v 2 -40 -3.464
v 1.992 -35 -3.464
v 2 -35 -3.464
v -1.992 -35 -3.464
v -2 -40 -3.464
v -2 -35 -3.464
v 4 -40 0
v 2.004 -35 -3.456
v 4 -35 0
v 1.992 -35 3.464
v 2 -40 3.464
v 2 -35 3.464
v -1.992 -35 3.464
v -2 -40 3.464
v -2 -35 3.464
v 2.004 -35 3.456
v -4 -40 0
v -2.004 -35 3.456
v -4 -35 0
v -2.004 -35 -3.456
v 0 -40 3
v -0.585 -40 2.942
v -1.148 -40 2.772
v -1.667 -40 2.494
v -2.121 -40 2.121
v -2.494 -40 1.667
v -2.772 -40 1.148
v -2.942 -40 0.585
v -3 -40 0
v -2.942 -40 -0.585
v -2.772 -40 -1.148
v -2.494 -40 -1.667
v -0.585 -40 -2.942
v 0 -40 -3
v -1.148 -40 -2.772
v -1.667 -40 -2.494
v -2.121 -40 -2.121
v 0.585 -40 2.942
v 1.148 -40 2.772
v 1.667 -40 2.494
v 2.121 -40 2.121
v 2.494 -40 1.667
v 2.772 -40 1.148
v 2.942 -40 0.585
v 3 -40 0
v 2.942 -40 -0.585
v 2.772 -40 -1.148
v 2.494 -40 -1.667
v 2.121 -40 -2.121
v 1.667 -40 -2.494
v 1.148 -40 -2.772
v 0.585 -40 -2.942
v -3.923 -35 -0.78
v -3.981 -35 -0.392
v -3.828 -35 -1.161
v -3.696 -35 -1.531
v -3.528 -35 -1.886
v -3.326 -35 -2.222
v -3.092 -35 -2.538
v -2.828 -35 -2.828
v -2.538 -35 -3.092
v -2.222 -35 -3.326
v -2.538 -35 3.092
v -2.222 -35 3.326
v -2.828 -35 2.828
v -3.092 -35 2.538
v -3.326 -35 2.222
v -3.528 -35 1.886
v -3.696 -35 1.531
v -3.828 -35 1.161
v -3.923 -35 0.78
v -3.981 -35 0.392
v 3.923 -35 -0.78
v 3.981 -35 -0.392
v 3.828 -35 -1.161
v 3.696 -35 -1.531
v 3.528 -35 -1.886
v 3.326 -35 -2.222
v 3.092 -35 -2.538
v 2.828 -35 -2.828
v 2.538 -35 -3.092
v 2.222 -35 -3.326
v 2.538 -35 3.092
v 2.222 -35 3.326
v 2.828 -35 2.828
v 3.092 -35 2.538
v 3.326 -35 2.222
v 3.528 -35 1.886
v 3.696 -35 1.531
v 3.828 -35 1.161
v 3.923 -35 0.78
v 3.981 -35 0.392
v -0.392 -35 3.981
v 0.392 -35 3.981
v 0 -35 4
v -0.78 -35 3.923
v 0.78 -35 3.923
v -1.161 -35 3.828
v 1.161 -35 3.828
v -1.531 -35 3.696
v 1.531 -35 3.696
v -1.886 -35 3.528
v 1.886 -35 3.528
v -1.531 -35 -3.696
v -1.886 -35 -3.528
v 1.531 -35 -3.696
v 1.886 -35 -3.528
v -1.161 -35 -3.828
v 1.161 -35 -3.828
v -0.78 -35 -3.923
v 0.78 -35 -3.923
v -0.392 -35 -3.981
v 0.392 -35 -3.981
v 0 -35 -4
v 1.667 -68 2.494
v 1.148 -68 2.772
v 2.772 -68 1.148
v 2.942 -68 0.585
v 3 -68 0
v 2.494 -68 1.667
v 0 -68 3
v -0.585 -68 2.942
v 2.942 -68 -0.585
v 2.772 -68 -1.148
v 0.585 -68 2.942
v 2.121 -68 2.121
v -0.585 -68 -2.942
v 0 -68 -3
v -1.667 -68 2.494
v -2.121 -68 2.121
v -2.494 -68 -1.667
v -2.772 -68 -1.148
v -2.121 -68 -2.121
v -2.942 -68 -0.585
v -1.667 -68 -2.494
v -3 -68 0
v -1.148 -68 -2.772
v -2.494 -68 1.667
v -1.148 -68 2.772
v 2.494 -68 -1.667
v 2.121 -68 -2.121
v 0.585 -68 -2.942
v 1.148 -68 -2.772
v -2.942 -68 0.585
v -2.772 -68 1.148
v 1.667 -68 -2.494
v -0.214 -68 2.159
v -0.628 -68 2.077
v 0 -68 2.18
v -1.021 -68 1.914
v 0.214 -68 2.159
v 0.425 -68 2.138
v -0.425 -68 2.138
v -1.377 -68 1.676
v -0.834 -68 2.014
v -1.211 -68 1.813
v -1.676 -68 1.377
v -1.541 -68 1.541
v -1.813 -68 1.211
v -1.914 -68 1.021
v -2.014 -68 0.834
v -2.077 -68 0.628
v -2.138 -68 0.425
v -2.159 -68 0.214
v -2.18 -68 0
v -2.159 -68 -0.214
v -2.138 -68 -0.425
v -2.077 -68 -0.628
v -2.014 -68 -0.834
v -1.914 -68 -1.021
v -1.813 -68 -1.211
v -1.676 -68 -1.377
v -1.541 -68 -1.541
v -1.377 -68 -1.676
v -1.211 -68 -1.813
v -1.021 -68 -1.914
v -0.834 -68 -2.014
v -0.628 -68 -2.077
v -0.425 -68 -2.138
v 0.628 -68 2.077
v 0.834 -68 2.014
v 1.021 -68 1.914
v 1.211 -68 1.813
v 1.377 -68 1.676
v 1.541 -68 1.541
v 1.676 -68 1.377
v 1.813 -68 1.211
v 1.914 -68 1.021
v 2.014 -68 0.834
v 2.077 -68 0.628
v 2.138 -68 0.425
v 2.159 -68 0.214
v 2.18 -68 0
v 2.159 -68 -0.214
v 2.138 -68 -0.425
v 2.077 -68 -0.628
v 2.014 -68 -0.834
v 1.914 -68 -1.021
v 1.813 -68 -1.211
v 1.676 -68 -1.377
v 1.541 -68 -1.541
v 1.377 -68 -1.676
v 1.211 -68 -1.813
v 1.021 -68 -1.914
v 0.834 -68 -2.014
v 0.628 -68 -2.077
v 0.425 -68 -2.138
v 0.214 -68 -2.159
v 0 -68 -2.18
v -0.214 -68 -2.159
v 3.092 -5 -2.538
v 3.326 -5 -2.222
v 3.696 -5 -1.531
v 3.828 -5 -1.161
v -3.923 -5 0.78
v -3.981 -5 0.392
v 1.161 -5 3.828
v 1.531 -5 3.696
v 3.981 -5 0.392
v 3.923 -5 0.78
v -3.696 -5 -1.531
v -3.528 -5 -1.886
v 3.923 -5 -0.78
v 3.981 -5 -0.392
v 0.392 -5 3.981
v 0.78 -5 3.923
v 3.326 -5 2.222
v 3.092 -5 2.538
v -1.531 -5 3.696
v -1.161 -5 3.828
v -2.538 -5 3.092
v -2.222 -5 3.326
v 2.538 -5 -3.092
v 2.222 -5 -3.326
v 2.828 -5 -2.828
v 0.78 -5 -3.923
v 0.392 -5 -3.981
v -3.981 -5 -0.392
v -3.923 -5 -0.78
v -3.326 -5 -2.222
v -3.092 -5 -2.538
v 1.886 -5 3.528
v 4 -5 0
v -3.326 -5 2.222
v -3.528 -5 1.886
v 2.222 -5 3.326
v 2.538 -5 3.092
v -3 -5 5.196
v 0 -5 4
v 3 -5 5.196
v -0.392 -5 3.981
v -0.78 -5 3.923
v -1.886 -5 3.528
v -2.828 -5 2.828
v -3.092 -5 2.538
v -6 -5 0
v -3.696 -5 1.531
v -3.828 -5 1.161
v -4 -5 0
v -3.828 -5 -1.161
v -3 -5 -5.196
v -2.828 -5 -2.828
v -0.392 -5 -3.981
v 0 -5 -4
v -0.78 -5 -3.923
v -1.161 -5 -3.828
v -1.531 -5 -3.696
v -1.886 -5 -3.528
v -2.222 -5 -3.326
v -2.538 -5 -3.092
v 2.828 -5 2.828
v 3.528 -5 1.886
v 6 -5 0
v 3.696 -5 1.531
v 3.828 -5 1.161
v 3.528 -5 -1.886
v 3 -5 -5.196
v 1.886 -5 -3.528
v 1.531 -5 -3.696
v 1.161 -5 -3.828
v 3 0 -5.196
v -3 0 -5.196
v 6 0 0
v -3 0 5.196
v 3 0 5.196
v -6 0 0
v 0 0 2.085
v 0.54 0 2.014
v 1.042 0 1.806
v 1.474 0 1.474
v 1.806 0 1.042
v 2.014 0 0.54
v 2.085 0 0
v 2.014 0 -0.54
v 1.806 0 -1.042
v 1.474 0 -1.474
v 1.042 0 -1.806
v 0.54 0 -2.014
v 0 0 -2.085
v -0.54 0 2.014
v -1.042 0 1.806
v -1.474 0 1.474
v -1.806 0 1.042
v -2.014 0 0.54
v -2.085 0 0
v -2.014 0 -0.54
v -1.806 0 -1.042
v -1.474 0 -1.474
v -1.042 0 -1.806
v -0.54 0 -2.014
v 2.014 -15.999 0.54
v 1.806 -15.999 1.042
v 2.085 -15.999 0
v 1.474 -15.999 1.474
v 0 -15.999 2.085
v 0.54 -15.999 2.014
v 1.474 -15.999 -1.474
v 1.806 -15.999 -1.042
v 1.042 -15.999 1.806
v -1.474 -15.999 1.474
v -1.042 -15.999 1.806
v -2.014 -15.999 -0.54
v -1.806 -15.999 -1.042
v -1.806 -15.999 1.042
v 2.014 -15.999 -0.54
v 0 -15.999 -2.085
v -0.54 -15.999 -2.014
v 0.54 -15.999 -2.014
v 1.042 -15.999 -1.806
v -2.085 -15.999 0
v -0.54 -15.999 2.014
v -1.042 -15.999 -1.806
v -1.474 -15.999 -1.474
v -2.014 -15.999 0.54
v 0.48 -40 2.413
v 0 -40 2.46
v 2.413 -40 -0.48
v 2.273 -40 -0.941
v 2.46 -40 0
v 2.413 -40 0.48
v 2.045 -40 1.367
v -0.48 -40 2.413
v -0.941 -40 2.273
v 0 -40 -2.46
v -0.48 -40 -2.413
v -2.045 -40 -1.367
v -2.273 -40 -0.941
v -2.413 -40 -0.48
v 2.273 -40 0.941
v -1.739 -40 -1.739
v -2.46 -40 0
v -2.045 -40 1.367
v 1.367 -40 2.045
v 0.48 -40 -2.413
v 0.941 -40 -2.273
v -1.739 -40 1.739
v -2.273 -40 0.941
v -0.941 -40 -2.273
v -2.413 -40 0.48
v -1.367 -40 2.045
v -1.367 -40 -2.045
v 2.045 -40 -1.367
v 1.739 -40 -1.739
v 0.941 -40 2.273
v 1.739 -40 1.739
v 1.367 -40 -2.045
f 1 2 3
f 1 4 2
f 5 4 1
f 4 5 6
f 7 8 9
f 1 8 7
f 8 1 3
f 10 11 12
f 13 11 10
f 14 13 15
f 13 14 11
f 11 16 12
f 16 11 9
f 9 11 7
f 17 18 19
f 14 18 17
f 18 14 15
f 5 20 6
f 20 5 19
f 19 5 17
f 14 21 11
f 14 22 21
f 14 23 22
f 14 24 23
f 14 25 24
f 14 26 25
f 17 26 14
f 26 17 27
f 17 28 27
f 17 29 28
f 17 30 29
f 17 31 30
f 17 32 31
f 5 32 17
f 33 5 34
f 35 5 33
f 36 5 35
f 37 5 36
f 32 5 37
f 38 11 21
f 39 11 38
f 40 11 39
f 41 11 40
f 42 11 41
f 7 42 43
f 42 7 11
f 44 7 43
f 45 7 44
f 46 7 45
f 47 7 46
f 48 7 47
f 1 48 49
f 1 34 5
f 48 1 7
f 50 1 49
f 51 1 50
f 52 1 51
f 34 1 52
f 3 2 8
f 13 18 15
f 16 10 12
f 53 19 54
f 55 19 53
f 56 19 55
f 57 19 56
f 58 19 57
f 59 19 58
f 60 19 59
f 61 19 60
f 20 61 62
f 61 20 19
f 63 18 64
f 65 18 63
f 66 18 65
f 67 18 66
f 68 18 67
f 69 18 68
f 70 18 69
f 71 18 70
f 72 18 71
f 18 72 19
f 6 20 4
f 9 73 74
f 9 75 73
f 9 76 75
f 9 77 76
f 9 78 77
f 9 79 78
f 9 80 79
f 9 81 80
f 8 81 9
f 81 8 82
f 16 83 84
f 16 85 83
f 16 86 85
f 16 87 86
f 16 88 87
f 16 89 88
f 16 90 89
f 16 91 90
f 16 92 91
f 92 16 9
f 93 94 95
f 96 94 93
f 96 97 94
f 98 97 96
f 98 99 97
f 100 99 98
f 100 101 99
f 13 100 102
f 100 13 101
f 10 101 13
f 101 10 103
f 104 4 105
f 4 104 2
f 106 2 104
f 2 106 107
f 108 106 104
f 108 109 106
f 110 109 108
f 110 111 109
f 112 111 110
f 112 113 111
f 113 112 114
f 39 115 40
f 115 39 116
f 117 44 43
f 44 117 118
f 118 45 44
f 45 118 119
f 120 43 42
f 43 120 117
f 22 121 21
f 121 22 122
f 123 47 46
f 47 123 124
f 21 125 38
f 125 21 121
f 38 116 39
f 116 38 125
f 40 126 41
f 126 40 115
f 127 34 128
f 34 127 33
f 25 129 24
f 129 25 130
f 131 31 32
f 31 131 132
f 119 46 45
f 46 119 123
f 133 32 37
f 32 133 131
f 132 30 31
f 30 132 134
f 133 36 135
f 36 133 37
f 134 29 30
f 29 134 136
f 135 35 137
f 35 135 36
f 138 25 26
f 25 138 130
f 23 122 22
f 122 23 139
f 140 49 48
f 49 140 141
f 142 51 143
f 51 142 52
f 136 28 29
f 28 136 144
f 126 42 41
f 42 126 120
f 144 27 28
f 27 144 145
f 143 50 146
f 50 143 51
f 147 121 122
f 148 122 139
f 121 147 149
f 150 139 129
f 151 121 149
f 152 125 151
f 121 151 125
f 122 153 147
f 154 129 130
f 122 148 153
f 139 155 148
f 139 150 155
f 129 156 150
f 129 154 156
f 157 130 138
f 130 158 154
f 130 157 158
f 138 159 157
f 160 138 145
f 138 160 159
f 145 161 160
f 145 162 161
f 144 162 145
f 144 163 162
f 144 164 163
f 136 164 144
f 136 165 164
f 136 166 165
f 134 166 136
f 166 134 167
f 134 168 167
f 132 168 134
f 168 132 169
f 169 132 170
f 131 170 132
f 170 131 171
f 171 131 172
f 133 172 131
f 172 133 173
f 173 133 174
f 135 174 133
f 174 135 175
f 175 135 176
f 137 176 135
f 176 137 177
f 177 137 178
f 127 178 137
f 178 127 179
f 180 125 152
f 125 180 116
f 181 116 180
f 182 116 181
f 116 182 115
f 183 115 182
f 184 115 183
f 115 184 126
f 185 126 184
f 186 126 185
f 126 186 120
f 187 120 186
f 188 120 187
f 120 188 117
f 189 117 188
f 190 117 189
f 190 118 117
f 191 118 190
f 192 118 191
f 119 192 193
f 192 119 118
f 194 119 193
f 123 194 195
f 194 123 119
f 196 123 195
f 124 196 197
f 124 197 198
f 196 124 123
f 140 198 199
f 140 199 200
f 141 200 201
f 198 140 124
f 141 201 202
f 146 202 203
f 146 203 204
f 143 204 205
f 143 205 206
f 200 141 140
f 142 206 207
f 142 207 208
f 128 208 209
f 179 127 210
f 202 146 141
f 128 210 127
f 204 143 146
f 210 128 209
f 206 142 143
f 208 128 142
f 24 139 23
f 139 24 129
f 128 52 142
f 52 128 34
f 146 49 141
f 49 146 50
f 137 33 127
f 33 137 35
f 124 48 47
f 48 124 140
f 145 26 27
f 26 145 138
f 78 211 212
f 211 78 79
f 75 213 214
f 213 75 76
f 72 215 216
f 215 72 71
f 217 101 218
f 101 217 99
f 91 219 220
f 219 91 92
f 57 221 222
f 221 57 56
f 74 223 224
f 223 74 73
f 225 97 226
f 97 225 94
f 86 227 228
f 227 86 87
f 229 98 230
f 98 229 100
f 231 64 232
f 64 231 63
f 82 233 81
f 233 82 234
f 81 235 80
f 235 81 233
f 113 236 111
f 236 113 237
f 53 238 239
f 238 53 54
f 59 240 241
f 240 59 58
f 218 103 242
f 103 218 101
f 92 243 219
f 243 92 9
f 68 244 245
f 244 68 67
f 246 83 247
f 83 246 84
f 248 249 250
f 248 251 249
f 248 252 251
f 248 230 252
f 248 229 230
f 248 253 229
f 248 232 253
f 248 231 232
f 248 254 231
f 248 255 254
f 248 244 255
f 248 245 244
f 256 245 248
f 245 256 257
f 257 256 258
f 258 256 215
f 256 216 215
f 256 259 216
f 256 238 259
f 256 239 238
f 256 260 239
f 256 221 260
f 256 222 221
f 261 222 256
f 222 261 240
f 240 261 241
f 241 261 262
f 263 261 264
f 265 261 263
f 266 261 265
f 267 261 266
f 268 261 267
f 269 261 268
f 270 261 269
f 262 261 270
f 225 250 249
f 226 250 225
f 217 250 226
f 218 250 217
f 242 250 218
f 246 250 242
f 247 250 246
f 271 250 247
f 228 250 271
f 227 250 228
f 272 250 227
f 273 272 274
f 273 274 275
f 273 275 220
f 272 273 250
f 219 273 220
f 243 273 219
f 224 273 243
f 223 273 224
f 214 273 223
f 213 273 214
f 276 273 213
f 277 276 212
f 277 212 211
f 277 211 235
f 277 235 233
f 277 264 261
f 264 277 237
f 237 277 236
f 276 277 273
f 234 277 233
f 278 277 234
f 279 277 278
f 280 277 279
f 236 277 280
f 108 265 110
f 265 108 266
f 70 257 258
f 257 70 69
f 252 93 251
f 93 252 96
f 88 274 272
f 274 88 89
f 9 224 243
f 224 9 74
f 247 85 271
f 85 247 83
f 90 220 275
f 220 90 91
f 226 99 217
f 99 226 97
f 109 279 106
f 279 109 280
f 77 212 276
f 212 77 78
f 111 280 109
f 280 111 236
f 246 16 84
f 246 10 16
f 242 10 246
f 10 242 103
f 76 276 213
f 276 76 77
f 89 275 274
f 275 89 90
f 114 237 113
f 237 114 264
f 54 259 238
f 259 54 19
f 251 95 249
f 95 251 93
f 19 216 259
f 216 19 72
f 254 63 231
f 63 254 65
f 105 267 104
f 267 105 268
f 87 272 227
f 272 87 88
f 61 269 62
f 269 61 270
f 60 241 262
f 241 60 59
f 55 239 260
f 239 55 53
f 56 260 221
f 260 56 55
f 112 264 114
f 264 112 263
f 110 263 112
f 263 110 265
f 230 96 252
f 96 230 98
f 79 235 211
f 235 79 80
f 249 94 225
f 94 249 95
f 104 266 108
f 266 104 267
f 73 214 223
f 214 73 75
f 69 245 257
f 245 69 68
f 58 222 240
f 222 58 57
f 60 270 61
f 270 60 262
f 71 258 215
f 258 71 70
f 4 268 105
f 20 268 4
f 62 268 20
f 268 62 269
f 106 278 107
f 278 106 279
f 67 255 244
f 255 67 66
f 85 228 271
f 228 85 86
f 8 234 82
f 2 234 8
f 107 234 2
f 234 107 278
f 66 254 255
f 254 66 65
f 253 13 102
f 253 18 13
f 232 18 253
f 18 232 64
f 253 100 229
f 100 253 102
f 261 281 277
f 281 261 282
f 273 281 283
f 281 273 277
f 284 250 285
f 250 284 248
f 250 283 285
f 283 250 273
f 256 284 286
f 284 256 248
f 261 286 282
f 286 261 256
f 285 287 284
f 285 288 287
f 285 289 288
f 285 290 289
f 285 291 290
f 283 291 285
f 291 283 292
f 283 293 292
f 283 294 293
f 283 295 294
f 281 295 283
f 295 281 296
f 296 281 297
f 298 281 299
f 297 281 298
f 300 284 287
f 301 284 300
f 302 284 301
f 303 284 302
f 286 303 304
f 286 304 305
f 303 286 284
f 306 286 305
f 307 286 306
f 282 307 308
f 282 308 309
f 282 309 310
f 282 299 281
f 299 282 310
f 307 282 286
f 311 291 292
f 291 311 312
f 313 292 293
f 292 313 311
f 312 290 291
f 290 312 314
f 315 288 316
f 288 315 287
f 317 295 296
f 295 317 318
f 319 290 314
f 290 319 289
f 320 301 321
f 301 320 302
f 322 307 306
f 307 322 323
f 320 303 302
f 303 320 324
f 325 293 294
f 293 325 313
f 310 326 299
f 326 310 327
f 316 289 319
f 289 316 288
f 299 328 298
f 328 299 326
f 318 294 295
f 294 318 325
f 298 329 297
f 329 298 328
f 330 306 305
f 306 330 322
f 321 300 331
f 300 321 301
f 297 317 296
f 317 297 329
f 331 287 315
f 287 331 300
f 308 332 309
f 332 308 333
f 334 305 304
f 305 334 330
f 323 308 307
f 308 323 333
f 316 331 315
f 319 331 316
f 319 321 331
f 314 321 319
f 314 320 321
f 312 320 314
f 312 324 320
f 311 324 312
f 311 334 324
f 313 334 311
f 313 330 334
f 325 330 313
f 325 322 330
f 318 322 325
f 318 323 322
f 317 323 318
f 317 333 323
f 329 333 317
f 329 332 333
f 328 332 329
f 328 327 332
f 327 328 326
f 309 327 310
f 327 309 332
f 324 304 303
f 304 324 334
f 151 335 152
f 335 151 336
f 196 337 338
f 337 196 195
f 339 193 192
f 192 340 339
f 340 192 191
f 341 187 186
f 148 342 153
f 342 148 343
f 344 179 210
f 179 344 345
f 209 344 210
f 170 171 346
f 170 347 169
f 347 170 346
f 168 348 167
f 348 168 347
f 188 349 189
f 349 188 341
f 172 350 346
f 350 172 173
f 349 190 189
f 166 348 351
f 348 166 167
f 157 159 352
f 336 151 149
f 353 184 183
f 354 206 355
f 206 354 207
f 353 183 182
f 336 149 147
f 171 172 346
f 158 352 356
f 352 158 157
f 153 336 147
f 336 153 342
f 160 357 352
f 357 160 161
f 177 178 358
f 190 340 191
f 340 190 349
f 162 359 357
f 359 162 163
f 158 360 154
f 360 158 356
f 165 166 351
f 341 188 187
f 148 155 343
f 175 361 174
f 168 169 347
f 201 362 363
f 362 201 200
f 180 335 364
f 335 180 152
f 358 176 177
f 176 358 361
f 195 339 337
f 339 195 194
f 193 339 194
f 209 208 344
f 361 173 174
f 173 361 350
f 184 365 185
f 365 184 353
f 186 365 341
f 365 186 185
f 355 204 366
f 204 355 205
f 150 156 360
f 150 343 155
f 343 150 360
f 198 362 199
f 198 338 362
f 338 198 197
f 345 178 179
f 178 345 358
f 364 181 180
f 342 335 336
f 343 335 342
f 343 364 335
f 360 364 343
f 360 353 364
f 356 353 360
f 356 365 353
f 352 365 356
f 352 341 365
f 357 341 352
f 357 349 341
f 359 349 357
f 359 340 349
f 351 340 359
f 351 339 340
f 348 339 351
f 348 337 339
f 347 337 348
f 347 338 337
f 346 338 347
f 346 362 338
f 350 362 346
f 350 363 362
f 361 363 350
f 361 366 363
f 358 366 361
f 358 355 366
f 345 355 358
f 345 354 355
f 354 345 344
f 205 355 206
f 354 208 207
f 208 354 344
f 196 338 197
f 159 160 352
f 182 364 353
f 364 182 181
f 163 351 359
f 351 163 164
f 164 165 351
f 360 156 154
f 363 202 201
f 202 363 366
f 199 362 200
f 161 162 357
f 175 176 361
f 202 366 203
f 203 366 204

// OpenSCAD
// Minute shaft (minshaft)
// October 2020

// TODO Need an offset more than a scale factor, for small stuff!
nail_16d_diam = 4.13 + .04;  // Drill #20

TAPER_PER_MM = 1/50;  // 1 mm diameter per 50 mm length

//Z1 = 0;
L1 = 5;
Z2 = L1;
L2 = 30;
Z3 = Z2 +  L2;
L3 = 5;
Z4 = Z3 + L3;
L4 = 28;
//Z5;

// Taper calculator for bores.  The bottom of the hole is always less
// than the nominal dimaeter.
function taper_calculator(length, nominal_diam, overdeep) = 
    [
        // Diameter at the bottom of the hole:
        nominal_diam - (overdeep * TAPER_PER_MM),
        // Outer diameter:
        nominal_diam + (length - overdeep) * TAPER_PER_MM,
    ];

// Orient as in the assembly model.
rotate([90,0,0])
{
    difference()
    {
        union()
        {
            // Hex head drives the Second Wheel (80T)
            // For legacy reasons, the diameter is not specified between parallel flats
            //TODO Bevel
            cylinder(h=L1, d=12, $fn=6);
            translate([0,0,L1])
            {
                // Smooth proximal shaft
                cylinder(h=L2, d=8, $fn=64);
                translate([0,0,L2])
                {
                    // Hex is driven by 40 Wheel pinion.
                    //TODO Bevel
                    cylinder(h=L3, d=8, $fn=6);
                    translate([0,0,L3])
                    {
                        // Smooth distal shaft.  Hourshaft rides on this.
                        cylinder(h=L4, d = 6, $fn=32);
                    }
                }
            }
        }
        
        // Bore for the 16d nail at proximal end
        translate([0,0,-0.001])
        cylinder(h=16, d=nail_16d_diam,$fn=24);
        
        // Taper bore for minute hand.
        taper_len = 50;
        taper_diams = taper_calculator(taper_len,4,4);
        echo(taper_diams);
        translate([0, 0, Z4])
        cylinder(h=taper_len, d1=taper_diams[1], d2=taper_diams[0],$fn=32);
    }
}
